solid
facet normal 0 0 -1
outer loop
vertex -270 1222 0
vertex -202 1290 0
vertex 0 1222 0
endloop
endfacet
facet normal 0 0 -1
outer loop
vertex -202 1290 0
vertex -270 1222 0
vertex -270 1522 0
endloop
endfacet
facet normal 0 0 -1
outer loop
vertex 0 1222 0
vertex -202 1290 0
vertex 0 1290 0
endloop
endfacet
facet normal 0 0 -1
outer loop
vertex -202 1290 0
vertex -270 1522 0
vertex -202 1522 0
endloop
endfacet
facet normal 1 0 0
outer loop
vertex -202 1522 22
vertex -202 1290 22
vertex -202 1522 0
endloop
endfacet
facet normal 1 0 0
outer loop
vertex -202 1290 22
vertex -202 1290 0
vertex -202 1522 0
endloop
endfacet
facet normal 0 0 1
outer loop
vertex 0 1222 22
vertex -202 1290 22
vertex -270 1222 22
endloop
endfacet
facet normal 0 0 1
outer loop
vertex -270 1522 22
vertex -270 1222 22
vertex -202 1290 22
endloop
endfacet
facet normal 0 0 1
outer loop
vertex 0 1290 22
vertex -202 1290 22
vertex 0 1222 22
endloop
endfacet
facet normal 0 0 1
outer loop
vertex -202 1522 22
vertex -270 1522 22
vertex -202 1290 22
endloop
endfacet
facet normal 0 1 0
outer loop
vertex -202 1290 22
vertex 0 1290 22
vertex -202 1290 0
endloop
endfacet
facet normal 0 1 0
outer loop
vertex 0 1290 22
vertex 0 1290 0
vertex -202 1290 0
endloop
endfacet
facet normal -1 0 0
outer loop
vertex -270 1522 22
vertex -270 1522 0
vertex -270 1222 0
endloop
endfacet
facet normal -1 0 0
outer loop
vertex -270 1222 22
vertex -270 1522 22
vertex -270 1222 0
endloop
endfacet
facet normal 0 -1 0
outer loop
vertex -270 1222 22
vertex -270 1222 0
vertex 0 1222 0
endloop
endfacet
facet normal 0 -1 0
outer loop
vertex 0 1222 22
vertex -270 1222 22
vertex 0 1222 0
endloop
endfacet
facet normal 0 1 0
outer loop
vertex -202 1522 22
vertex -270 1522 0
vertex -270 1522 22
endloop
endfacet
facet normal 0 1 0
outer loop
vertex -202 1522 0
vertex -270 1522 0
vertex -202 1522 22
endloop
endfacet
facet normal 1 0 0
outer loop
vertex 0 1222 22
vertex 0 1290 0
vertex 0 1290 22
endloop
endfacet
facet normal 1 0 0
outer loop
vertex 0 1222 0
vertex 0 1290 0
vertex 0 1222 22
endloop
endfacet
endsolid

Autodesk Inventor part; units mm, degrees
ref_plane "YZ Plane" through (0, 0, 0) normal (1, 0, 0) x (0, 1, 0)
ref_plane "XZ Plane" through (0, 0, 0) normal (0, 1, 0) x (-1, 0, 0)
ref_plane "XY Plane" through (0, 0, 0) normal (0, 0, 1) x (1, 0, 0)
ref_plane "Work Plane1" through (-1022, 1522, 0) normal (0, 0, 1) x (1, 0, 0)
sketch "Sketch1" plane through (-1022, 1522, 0) normal (0, 0, 1) x (1, 0, 0)
  line L0 (1022, 22) -> (1022, -1522) projected
  line L1 (1022, 22) -> (1000, 22) projected
  line L2 (1000, -1522) -> (1000, 22) projected
  line L3 (1022, -1522) -> (1000, -1522) projected
  circle A0 centre (880.1401, -150.1401) radius 55 projected
  line L4 (0, 0) -> (1000, 0) projected
  line L5 (1000, 0) -> (1000, 22) projected
  line L6 (0, 22) -> (1000, 22) projected
  line L7 (0, 0) -> (0, 22) projected
  line L8 (752, 0) -> (752, -300)
  line L9 (752, -300) -> (1022, -300)
  line L10 (1022, -300) -> (1022, -232)
  line L11 (1022, -232) -> (820, -232)
  line L12 (820, -232) -> (820, 0)
  line L13 (1022, 22) -> (1000, 22)
  line L14 (820, 0) -> (752, 0)
  line L15 (0, 0) -> (2000, 0) construction
  line L16 (0, 0) -> (2000, 0) construction
  point P0 (1022, -1522)
  dimension "d0" = 270
  dimension "d1" = 300
  dimension "d3" = 232
  dimension "d4" = 202
  dimension "d6" = 2000
  dimension "d8" = 1022
extrude "Extrusion1" add sketch "Sketch1" along normal blind 22 contours L0 L9 L2 L11 | L2 L9 L8 L4 L12 L11
properties part number "Jig_nodeAirInlet"
